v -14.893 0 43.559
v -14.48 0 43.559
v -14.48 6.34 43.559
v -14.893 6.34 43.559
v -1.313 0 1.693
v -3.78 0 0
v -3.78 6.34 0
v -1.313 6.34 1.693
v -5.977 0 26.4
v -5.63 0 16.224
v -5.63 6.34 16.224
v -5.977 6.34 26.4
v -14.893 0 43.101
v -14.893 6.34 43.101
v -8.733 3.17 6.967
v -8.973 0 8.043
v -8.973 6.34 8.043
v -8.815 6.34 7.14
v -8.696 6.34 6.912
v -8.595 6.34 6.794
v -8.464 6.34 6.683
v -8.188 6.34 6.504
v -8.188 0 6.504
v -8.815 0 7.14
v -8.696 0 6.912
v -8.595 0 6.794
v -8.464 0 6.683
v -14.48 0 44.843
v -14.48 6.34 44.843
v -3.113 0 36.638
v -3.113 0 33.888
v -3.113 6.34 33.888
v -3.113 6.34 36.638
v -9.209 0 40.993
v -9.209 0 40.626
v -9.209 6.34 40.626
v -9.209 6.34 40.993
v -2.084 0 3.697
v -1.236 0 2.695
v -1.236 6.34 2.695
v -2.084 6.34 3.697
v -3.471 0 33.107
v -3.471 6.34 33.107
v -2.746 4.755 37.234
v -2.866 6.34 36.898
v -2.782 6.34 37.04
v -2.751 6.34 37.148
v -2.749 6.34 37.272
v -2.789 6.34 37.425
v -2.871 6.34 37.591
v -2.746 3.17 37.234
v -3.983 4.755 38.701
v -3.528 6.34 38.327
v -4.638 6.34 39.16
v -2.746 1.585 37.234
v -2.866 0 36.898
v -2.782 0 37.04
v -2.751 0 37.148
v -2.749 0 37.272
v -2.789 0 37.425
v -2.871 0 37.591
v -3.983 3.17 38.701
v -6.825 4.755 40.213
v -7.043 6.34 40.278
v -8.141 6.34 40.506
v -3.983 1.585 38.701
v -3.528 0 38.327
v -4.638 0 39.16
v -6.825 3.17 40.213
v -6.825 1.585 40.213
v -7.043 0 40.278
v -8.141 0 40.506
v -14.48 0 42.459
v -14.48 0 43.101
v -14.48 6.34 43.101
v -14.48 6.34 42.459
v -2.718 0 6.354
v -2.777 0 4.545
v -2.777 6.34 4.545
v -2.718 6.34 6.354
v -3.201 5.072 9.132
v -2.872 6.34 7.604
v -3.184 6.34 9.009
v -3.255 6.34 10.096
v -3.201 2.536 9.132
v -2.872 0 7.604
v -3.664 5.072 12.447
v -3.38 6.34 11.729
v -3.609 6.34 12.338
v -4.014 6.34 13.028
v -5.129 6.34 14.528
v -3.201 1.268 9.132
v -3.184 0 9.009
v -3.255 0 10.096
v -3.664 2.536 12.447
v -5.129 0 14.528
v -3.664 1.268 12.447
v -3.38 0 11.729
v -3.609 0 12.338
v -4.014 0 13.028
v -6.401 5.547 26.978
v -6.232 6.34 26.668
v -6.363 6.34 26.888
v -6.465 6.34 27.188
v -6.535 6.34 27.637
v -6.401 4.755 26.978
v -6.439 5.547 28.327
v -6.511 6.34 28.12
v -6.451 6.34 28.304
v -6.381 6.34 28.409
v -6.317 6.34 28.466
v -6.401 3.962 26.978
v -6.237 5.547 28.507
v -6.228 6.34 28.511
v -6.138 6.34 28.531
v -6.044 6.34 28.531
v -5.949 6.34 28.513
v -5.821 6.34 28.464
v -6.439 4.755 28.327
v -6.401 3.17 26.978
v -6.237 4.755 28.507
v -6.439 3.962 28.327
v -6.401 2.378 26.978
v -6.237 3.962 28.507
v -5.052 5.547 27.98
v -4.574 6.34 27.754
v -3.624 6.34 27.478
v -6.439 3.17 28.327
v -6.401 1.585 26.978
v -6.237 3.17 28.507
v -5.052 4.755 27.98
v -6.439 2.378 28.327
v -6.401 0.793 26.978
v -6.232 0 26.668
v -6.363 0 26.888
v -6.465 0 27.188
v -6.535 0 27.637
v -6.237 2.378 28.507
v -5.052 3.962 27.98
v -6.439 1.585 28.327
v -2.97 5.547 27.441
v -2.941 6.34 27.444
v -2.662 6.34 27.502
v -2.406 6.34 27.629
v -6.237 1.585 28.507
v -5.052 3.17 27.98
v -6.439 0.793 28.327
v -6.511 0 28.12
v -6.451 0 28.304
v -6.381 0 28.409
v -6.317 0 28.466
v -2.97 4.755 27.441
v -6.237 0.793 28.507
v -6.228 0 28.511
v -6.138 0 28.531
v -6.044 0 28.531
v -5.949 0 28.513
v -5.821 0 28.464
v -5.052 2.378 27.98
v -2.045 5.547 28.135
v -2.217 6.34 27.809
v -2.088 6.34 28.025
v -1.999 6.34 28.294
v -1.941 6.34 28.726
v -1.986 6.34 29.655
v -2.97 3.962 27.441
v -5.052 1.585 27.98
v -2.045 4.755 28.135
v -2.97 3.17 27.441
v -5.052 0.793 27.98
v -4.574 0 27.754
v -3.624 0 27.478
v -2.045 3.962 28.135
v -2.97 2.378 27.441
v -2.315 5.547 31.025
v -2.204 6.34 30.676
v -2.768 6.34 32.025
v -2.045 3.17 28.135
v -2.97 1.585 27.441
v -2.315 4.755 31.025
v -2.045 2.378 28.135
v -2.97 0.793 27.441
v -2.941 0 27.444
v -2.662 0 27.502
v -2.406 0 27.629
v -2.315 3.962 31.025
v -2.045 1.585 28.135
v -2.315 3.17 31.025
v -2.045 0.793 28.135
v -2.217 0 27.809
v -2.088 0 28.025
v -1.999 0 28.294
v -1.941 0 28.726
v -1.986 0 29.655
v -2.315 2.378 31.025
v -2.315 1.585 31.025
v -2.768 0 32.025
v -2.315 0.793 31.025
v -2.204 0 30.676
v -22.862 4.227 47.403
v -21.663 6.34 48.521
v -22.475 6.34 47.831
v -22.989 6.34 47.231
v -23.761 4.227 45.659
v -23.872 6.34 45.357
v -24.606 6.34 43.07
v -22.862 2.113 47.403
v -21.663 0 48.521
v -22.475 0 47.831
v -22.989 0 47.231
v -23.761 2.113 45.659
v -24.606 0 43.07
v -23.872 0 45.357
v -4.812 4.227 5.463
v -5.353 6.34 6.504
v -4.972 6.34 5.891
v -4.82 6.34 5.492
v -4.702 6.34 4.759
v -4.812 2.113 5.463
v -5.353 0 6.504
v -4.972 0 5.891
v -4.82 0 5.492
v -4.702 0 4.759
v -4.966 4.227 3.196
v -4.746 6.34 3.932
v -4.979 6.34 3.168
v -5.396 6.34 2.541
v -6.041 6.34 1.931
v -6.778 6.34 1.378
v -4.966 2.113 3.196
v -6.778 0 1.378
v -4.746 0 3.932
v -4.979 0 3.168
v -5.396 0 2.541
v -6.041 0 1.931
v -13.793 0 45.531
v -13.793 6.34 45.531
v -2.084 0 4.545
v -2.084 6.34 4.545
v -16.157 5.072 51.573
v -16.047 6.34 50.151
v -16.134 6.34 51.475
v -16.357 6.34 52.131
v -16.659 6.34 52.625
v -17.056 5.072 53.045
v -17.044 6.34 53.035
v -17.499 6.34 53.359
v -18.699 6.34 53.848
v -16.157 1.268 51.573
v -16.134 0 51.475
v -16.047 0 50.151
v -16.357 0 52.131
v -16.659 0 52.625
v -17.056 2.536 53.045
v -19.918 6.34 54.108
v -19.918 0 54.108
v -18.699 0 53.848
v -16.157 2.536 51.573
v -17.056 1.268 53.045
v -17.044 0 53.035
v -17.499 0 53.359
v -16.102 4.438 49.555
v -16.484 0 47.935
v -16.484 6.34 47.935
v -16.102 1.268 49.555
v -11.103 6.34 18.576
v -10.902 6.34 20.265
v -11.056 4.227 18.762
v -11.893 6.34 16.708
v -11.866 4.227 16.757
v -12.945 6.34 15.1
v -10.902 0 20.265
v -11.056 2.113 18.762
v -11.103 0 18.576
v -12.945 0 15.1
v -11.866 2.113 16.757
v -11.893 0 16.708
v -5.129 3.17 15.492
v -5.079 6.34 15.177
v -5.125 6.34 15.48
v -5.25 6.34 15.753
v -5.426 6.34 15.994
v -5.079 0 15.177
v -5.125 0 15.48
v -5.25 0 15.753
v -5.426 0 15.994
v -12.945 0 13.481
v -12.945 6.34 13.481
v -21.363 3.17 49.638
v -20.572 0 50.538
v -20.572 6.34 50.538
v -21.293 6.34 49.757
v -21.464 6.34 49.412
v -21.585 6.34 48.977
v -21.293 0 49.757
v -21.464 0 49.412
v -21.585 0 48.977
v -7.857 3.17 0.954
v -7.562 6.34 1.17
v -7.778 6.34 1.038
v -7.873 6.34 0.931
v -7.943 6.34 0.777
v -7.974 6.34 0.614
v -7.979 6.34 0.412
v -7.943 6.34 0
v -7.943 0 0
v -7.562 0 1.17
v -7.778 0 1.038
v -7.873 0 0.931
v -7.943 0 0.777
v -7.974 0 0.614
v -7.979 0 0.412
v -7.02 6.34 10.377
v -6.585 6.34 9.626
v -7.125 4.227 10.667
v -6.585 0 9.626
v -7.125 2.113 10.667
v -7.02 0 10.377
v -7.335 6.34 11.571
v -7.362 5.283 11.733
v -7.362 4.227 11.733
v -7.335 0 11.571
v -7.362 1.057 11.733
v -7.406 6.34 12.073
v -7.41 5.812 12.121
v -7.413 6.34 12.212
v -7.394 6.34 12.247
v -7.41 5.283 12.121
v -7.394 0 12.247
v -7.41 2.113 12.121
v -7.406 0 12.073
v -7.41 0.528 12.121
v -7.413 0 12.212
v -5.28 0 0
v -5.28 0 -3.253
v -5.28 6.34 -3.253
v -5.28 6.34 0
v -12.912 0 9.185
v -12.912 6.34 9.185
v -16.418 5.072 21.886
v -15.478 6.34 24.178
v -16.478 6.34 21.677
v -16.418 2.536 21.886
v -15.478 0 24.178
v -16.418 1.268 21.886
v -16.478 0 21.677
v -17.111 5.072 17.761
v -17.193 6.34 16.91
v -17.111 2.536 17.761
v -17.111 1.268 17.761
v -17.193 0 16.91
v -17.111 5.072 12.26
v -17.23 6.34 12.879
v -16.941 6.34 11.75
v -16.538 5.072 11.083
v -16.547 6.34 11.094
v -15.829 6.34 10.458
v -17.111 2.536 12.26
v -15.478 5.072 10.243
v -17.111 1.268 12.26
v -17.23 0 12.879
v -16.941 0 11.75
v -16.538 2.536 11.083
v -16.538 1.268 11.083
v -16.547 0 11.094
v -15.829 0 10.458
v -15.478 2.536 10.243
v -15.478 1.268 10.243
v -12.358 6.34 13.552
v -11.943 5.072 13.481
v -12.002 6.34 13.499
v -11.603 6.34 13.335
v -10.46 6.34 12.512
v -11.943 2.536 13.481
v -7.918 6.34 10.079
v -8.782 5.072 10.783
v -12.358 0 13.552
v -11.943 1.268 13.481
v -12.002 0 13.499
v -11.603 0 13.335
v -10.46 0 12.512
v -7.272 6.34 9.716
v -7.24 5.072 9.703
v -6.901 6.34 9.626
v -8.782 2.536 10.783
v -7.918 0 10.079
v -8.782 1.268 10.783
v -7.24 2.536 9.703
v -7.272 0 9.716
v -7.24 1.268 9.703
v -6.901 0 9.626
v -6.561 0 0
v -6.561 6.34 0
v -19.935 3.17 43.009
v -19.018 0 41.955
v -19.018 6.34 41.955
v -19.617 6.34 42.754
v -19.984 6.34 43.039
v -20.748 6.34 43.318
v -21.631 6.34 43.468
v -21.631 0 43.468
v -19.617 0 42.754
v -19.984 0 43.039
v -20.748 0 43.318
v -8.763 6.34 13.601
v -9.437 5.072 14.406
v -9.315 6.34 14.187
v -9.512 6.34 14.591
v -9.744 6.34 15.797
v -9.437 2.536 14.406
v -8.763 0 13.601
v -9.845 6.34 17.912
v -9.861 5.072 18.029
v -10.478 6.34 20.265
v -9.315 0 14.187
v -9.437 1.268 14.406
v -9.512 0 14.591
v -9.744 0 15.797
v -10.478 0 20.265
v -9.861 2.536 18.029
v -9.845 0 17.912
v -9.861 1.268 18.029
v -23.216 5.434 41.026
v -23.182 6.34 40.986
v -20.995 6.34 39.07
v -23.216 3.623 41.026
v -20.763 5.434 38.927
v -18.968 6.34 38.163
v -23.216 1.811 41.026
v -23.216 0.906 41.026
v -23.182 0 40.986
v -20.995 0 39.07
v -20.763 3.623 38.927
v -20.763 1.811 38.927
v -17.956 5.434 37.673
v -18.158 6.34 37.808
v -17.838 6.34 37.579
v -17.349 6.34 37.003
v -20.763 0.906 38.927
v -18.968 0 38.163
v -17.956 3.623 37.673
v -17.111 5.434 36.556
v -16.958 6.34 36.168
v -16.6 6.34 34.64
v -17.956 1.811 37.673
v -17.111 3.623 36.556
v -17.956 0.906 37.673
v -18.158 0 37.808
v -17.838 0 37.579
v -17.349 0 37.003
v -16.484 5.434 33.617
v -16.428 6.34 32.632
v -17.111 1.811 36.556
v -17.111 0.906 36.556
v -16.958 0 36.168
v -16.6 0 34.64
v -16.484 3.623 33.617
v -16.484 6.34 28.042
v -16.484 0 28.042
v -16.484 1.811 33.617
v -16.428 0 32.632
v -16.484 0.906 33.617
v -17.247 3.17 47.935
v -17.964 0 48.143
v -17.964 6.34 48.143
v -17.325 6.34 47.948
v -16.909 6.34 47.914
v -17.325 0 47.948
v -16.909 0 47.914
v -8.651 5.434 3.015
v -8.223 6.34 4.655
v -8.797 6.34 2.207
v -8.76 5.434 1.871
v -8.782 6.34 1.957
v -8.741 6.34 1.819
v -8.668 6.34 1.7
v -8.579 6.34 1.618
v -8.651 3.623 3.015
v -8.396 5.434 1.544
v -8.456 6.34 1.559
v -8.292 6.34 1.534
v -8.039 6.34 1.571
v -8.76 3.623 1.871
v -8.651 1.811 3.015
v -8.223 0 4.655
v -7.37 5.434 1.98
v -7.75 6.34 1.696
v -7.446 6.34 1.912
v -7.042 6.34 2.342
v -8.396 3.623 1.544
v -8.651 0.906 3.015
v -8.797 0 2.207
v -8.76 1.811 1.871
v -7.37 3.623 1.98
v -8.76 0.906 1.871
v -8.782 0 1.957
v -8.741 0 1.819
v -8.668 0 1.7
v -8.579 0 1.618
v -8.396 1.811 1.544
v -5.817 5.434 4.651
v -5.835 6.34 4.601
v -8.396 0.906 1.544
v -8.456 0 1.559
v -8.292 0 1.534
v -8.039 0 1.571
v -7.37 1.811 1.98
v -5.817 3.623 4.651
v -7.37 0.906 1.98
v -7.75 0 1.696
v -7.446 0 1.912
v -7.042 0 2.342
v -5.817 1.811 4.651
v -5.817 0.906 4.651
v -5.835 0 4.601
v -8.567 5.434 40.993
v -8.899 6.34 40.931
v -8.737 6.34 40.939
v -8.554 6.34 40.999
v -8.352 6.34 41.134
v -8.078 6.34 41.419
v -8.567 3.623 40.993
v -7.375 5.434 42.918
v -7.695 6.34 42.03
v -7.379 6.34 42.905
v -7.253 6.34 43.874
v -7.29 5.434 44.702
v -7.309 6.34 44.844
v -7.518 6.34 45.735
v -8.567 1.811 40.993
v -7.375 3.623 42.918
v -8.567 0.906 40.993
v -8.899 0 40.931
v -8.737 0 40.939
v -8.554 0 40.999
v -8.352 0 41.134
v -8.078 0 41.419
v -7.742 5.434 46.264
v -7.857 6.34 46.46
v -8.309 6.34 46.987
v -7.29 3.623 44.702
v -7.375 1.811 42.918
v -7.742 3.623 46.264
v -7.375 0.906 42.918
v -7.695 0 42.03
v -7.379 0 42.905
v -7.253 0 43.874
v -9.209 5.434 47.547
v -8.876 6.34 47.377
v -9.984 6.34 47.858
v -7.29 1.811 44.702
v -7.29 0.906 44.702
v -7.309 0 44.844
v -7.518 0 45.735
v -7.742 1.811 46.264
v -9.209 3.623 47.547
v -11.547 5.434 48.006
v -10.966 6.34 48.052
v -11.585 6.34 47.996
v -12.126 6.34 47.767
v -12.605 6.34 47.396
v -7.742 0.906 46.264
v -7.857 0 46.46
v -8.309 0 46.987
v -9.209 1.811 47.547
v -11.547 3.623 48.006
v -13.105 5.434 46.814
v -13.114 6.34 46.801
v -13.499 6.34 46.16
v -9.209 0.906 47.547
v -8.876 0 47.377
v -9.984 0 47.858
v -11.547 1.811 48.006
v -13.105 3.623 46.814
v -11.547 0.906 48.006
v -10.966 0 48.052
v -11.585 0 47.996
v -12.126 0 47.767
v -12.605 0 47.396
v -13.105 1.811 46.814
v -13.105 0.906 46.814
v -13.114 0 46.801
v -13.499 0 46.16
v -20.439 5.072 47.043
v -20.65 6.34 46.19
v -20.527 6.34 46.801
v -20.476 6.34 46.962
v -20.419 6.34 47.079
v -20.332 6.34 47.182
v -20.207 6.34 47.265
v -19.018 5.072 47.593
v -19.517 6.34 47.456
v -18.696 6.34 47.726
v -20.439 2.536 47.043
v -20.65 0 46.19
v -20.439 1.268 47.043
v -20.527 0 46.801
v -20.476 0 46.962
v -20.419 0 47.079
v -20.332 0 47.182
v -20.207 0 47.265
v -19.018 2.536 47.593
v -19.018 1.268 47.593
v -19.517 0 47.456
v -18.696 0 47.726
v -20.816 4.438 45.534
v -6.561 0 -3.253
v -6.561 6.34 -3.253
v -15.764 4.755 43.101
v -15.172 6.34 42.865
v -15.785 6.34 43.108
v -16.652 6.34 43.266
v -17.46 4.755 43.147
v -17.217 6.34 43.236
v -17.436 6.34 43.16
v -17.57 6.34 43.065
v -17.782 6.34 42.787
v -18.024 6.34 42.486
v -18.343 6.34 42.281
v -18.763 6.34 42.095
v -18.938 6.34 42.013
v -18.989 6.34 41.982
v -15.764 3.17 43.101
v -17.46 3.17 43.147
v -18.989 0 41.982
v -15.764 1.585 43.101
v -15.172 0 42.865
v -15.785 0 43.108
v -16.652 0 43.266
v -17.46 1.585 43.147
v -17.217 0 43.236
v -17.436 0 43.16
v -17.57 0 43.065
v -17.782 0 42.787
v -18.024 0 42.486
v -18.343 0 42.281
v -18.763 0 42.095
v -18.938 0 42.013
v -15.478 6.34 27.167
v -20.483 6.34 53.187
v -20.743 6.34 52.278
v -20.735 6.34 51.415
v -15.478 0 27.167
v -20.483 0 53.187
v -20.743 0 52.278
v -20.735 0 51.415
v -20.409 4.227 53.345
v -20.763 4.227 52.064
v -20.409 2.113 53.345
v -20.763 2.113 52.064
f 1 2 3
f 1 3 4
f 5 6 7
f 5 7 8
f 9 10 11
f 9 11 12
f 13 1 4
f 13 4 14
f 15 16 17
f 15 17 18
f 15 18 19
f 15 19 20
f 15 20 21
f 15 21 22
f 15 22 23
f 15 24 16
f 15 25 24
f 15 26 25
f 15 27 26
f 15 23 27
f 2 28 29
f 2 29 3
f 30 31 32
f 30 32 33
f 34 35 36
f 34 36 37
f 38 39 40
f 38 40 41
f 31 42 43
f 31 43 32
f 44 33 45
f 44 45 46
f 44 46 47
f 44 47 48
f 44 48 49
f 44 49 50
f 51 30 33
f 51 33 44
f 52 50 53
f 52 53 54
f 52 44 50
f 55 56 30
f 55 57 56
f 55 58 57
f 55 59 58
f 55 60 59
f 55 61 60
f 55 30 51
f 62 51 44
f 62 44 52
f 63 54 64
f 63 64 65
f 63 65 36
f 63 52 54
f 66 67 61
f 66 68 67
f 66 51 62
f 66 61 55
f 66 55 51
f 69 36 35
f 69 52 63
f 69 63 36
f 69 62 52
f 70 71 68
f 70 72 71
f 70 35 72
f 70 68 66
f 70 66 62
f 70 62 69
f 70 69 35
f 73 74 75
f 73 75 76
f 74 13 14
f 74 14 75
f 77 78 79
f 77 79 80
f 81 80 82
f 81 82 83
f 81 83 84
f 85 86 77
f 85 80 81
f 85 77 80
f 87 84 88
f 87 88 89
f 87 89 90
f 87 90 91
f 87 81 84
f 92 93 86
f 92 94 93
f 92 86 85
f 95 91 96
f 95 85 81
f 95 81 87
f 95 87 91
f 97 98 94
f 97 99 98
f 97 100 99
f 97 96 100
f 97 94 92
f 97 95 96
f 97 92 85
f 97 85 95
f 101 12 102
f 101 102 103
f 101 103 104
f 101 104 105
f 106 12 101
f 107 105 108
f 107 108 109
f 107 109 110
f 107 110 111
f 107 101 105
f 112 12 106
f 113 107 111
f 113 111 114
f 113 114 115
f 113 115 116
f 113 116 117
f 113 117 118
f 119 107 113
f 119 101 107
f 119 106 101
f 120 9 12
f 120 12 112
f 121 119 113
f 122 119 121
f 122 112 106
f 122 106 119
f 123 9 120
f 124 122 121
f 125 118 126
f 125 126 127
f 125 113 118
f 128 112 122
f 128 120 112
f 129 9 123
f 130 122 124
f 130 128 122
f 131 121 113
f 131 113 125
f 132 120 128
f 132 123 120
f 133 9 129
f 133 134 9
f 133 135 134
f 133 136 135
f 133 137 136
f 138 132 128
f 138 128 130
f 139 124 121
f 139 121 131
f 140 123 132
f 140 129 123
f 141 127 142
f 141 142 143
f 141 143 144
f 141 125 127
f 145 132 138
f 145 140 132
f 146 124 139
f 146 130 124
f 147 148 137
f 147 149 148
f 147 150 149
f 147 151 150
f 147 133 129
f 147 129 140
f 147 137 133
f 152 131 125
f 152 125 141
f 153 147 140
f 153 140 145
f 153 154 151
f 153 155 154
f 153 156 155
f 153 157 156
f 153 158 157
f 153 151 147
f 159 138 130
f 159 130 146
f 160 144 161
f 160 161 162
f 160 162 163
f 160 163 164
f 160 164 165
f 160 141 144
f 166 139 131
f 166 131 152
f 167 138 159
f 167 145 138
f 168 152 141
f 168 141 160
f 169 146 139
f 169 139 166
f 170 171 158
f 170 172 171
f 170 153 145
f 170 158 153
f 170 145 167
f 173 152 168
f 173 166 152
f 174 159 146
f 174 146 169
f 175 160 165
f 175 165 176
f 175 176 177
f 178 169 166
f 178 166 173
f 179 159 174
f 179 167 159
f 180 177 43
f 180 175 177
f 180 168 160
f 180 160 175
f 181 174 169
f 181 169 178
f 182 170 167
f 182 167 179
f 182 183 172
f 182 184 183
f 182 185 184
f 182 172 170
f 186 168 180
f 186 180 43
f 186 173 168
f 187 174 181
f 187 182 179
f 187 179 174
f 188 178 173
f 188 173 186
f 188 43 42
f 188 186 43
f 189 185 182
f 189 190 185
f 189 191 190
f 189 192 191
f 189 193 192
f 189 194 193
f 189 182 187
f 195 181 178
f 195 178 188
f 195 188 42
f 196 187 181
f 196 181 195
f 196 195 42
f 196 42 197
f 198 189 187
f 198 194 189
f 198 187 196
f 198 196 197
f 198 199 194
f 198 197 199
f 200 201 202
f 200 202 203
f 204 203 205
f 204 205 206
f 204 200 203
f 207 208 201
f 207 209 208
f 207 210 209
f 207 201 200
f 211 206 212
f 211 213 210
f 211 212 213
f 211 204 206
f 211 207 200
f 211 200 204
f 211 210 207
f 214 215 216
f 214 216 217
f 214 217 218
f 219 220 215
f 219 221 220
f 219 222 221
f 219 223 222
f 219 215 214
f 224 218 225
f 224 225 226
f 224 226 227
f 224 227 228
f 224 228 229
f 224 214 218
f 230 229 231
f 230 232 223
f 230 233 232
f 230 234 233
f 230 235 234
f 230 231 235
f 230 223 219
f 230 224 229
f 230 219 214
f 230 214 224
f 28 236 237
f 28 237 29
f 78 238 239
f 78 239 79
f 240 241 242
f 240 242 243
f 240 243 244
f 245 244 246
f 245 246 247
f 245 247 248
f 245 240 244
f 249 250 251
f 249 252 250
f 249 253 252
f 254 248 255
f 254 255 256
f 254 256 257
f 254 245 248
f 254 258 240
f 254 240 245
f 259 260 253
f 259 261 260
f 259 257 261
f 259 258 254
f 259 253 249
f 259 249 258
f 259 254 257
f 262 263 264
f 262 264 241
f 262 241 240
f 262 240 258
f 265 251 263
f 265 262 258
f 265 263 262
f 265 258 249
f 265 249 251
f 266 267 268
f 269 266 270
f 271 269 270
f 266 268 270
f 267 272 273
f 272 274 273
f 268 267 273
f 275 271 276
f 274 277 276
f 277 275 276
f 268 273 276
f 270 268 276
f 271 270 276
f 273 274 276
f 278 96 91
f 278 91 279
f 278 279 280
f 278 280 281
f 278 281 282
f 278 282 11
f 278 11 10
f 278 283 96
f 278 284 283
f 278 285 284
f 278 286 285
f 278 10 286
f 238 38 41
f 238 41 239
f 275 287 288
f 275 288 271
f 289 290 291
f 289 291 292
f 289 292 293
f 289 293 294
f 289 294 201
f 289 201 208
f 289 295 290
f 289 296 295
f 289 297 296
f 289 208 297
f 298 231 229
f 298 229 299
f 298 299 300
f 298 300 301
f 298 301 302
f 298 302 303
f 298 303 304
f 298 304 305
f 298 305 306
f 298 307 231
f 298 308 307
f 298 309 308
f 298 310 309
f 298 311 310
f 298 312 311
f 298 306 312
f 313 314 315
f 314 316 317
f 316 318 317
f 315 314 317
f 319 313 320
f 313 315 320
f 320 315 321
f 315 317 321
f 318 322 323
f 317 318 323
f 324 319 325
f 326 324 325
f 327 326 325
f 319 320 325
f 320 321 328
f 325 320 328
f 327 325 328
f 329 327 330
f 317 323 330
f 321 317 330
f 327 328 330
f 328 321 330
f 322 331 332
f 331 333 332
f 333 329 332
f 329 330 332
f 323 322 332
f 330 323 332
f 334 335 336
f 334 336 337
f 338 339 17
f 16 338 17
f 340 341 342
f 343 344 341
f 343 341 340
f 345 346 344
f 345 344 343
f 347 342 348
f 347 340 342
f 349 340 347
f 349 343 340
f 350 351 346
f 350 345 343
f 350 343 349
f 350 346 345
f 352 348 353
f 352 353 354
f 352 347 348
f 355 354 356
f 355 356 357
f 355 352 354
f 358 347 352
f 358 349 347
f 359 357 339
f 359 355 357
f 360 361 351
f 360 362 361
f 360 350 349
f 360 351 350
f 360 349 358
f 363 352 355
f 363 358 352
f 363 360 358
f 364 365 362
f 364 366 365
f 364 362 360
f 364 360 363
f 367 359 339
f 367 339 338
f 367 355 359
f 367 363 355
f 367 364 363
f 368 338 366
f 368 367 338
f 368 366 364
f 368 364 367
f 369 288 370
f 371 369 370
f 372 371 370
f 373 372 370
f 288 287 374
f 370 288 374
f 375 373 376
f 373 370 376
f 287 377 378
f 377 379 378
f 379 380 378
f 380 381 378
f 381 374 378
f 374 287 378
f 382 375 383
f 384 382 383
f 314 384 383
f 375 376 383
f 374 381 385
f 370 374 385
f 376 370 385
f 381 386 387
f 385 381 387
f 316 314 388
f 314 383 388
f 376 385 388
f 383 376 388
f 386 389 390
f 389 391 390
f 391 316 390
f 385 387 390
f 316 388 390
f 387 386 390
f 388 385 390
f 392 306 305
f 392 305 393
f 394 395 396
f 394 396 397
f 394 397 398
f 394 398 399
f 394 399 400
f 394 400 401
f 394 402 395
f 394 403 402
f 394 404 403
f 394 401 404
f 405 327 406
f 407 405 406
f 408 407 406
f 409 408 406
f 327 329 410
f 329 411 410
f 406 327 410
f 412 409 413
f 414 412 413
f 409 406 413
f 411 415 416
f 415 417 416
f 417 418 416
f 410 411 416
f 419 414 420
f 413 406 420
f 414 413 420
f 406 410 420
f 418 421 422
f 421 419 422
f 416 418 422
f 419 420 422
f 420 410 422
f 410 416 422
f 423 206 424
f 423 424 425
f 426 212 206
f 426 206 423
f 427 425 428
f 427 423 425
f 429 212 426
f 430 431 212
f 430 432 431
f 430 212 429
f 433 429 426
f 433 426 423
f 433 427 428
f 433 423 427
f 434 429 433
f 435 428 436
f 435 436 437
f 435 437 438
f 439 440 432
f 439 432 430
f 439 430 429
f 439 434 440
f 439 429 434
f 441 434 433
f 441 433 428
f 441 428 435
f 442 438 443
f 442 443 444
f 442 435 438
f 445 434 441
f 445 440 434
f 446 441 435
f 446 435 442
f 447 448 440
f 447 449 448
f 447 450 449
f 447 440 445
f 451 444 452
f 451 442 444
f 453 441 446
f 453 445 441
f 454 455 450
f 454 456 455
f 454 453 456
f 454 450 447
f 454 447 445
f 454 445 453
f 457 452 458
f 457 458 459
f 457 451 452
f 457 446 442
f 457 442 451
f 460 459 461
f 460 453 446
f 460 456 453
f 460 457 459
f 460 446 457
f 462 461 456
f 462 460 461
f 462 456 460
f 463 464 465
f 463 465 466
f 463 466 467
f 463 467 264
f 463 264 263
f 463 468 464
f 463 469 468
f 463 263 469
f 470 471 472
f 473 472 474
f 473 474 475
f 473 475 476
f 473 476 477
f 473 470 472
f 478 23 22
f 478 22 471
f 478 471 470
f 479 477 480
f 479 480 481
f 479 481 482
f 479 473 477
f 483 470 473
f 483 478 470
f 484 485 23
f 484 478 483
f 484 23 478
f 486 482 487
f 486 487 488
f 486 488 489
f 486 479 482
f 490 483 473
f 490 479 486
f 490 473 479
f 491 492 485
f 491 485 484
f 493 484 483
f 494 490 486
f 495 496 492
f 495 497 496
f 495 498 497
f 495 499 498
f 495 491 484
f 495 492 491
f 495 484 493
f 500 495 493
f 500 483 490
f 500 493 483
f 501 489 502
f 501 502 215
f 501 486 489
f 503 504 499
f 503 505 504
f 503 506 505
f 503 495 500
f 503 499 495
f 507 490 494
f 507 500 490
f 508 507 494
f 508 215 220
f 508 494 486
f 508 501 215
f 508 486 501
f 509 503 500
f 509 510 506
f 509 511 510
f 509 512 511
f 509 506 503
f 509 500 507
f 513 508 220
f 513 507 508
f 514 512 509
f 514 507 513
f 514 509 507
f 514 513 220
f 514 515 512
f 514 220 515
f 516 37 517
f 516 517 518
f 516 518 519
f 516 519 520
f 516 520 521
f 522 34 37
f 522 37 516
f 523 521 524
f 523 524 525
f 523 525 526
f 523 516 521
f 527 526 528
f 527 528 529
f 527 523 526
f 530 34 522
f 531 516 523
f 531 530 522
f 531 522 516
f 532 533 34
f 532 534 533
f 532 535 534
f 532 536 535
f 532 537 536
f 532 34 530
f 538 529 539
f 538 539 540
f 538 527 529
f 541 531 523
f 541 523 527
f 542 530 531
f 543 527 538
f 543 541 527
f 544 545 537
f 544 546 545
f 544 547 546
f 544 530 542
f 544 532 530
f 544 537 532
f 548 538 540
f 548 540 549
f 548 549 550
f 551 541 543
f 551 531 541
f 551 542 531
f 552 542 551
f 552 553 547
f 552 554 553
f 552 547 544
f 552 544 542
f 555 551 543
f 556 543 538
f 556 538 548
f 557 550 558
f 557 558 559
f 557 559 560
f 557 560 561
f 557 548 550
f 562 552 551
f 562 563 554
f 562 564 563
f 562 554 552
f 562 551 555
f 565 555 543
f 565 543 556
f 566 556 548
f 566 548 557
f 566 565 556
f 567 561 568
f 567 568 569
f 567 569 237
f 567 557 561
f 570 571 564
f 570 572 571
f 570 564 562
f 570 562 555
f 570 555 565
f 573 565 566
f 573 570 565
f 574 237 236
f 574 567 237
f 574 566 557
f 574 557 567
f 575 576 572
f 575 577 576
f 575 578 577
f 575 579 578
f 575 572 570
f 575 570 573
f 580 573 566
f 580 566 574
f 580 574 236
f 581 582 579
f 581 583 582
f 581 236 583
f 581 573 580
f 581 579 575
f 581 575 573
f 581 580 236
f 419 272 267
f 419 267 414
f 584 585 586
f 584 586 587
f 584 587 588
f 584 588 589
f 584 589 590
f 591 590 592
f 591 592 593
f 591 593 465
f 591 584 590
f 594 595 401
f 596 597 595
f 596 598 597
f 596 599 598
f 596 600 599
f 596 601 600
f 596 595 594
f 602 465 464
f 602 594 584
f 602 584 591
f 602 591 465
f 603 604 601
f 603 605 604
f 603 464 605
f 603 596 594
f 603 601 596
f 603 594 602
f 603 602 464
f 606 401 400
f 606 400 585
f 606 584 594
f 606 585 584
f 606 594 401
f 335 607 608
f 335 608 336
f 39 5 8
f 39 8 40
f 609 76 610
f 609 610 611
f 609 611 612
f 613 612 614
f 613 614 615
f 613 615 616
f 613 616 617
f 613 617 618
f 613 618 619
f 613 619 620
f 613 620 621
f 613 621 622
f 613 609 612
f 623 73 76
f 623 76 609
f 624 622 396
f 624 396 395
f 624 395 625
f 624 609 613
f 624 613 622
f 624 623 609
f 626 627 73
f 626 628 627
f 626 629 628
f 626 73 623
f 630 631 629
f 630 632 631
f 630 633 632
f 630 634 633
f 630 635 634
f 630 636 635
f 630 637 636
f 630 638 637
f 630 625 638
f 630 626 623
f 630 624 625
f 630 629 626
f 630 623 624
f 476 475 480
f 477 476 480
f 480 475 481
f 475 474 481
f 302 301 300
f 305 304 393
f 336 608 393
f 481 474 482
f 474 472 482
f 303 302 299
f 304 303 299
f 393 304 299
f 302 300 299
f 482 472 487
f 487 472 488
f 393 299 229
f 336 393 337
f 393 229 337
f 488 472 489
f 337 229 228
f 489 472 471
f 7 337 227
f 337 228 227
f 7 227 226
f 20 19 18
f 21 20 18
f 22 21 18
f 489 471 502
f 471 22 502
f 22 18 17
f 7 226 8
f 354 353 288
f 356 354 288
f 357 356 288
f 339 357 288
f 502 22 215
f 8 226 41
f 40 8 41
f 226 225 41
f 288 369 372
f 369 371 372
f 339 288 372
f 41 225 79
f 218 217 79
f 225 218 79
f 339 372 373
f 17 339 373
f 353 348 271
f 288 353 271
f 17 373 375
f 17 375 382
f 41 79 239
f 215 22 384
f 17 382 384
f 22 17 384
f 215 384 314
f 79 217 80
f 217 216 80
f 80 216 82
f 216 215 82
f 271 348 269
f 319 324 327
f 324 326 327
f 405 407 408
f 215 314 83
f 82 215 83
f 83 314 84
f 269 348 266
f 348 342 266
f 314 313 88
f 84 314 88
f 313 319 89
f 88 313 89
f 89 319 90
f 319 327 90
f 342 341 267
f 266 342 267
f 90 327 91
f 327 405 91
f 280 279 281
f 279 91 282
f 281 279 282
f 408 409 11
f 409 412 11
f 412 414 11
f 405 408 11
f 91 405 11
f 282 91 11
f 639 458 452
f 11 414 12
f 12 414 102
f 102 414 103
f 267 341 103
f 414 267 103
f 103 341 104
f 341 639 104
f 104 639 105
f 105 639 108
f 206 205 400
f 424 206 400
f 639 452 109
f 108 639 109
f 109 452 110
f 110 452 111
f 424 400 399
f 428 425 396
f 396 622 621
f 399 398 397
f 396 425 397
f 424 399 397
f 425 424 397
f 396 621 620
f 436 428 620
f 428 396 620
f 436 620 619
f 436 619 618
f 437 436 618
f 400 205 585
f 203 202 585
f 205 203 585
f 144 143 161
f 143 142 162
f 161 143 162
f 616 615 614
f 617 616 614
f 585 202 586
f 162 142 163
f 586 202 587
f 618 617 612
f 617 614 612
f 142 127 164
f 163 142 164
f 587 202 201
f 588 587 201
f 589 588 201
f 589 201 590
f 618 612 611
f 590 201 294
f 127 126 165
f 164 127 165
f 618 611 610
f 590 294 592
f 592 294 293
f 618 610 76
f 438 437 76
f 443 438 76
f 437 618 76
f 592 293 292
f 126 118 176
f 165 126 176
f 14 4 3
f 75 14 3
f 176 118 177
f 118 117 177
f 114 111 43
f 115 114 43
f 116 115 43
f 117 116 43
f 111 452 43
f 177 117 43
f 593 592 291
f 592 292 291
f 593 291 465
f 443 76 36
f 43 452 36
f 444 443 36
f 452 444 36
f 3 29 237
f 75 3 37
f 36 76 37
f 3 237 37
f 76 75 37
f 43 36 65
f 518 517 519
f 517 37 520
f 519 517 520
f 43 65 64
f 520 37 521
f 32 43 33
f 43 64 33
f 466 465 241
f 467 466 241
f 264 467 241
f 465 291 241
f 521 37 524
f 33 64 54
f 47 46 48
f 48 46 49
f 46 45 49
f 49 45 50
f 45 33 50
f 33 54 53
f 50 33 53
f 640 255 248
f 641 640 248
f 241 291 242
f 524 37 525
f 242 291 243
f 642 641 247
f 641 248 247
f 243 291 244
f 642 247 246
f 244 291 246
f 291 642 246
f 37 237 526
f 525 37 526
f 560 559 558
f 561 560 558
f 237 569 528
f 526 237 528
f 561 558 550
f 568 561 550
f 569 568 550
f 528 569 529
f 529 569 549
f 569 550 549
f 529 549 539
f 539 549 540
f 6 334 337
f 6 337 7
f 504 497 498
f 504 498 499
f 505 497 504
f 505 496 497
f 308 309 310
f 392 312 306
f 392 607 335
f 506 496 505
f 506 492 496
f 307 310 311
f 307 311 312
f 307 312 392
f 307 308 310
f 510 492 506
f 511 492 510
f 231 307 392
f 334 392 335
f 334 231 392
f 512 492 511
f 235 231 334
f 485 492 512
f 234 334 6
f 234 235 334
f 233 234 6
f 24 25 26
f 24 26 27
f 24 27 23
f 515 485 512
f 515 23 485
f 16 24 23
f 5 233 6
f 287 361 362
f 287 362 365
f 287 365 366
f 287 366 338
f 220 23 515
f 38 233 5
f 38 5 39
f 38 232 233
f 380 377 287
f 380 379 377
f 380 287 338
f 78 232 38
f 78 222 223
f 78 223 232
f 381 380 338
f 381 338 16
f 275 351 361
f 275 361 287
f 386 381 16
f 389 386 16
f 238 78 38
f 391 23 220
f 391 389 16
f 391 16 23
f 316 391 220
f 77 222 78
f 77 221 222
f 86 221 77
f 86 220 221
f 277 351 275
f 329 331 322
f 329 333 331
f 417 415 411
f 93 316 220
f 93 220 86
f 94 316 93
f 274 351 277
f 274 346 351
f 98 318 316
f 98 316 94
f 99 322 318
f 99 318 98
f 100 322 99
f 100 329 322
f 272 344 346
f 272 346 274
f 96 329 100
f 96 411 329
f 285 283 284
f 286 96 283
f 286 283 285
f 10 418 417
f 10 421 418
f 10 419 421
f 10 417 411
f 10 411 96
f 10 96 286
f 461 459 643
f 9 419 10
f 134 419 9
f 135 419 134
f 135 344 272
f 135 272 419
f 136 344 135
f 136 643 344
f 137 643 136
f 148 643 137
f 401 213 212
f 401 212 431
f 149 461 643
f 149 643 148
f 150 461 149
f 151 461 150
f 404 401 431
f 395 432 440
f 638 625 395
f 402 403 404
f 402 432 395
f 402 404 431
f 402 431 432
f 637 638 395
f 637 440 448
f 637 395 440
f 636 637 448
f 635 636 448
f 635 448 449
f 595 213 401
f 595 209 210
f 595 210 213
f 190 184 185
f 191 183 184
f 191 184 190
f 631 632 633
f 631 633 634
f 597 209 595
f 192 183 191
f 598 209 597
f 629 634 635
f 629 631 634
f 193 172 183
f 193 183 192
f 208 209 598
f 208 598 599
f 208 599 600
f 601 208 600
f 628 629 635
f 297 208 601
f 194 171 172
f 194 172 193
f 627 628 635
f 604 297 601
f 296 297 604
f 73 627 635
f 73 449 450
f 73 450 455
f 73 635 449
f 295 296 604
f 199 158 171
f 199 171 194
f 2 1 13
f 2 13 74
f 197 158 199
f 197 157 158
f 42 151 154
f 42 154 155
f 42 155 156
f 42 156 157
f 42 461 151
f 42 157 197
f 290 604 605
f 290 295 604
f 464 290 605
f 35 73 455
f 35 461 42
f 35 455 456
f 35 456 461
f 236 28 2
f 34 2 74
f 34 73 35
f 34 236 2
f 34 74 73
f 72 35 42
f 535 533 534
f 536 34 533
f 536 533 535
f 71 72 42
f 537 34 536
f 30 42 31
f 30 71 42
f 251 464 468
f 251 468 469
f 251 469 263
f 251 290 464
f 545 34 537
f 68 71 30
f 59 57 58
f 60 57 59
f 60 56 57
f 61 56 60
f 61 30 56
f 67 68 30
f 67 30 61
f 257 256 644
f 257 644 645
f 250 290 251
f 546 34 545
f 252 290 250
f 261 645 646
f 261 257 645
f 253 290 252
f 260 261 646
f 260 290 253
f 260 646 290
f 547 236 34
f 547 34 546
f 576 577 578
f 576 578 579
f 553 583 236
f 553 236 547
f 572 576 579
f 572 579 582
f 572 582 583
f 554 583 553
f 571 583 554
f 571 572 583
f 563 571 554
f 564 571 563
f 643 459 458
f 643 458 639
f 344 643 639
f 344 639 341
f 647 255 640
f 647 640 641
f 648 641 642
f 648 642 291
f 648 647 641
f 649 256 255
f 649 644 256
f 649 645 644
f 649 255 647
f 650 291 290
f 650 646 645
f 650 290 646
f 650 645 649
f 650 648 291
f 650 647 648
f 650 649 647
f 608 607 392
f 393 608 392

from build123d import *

# Parameters (mm, degrees)
F0_W     = 1.2808465399
F0_H     = 3.2528243028
F1_DEPTH = 6.34


with BuildPart() as f1:
    # F0 (on Front) → F1 (new body)
    with BuildSketch(Plane.XZ):
        with BuildLine():
            add(Edge.make_bspline(
                [(-6.7776860669, 1.3776483247), (-7.2234603457, 1.2909326007), (-8.0743075484, 1.125418719), (-7.9850199205, 0.3629822004), (-7.9425117001, 0)],
                knots=[0, 0, 0, 0, 0.5239181341, 1, 1, 1, 1], degree=3))
            Line((-7.9425117001, 0), (-6.5613263287, 0))
            Line((-6.5613263287, 0), (-5.2804797888, 0))
            Line((-5.2804797888, 0), (-3.7796341348, 0))
            Line((-3.7796341348, 0), (-1.3127436396, 1.6925429227))
            Line((-1.3127436396, 1.6925429227), (-1.2356528314, 2.6947180741))
            Line((-1.2356528314, 2.6947180741), (-2.0836470649, 3.696893109))
            Line((-2.0836470649, 3.696893109), (-2.0836470649, 4.5448862948))
            Line((-2.0836470649, 4.5448862948), (-2.7774595656, 4.5448862948))
            add(Edge.make_bspline(
                [(-2.7774595656, 4.5448862948), (-2.7222918755, 5.4227665899), (-2.6171633368, 7.095671009), (-3.3418714879, 9.0647313949), (-3.1895937315, 11.1185620313), (-3.5661824677, 12.5226659789), (-4.5589625844, 13.7968401), (-5.1287151873, 14.528083615)],
                knots=[0, 0, 0, 0, 0.2208538869, 0.4208631238, 0.6150791168, 0.7790954196, 1, 1, 1, 1], degree=3))
            add(Edge.make_bspline(
                [(-5.1287151873, 14.528083615), (-5.0843041296, 14.8663420012), (-4.9972753618, 15.5291996788), (-5.4218763651, 15.9956514421), (-5.6298021227, 16.2240713835)],
                knots=[0, 0, 0, 0, 0.5103031883, 1, 1, 1, 1], degree=3))
            Line((-5.6298021227, 16.2240713835), (-5.9767086059, 26.3999961317))
            add(Edge.make_bspline(
                [(-5.9767086059, 26.3999961317), (-6.1345706405, 26.5459935085), (-6.5090194045, 26.892299303), (-6.6380961915, 28.4273694482), (-5.8892792504, 28.6339642055), (-5.0967846196, 27.8496412338), (-2.9462288603, 27.1864042532), (-1.6935919751, 28.0392956056), (-2.1433240874, 31.2088312454), (-3.0434896338, 32.4954295626), (-3.4712727647, 33.1068560481)],
                knots=[0, 0, 0, 0, 0.0887577471, 0.2105333863, 0.2847342937, 0.393212341, 0.5469207023, 0.6596399946, 0.8382516756, 1, 1, 1, 1], degree=3))
            Line((-3.4712727647, 33.1068560481), (-3.1125457026, 33.8876135647))
            Line((-3.1125457026, 33.8876135647), (-3.1125457026, 36.6379059851))
            add(Edge.make_bspline(
                [(-3.1125457026, 36.6379059851), (-2.9242706246, 36.816100008), (-2.424179038, 37.2894145462), (-4.0468332885, 38.9269143997), (-6.759011061, 40.3903422302), (-8.4321410003, 40.5511578163), (-9.2090247199, 40.6258292496)],
                knots=[0, 0, 0, 0, 0.1501364865, 0.3987888069, 0.7208398601, 1, 1, 1, 1], degree=3))
            Line((-9.2090247199, 40.6258292496), (-9.2090247199, 40.9925356507))
            add(Edge.make_bspline(
                [(-9.2090247199, 40.9925356507), (-9.0042836623, 40.9378253354), (-8.4149612837, 40.7803483081), (-6.9474231725, 42.9394160939), (-7.4419385897, 46.4591291567), (-9.1064865307, 47.6192620157), (-11.6272430043, 48.4378875285), (-13.1998511262, 46.8659793565), (-13.6052353603, 45.9530216087), (-13.7928435579, 45.530512929)],
                knots=[0, 0, 0, 0, 0.0826928045, 0.2380212391, 0.4274132015, 0.571526221, 0.7308515859, 0.8754405213, 1, 1, 1, 1], degree=3))
            Line((-13.7928435579, 45.530512929), (-14.4804157317, 44.8429398239))
            Line((-14.4804157317, 44.8429398239), (-14.4804157317, 43.5594730079))
            Line((-14.4804157317, 43.5594730079), (-14.8929599673, 43.5594730079))
            Line((-14.8929599673, 43.5594730079), (-14.8929599673, 43.1010909379))
            Line((-14.8929599673, 43.1010909379), (-14.4804157317, 43.1010909379))
            Line((-14.4804157317, 43.1010909379), (-14.4804157317, 42.4593538046))
            add(Edge.make_bspline(
                [(-14.4804157317, 42.4593538046), (-14.8571961778, 42.699844745), (-15.6436727796, 43.2018360228), (-17.6518789594, 43.4153809515), (-17.8380897009, 42.3469828314), (-18.9262205482, 42.0669953128), (-19.0183967352, 41.9551357627)],
                knots=[0, 0, 0, 0, 0.2495868987, 0.5209778212, 0.7197200287, 0.9369146526, 0.9369146526, 0.9369146526, 0.9369146526], degree=3))
            add(Edge.make_bspline(
                [(-19.0183967352, 41.9551357627), (-19.2771846319, 42.3572771528), (-19.8261713987, 43.2103707651), (-21.0069857299, 43.3787766294), (-21.6311737895, 43.467797339)],
                knots=[0, 0, 0, 0, 0.4713918665, 1, 1, 1, 1], degree=3))
            add(Edge.make_bspline(
                [(-21.6311737895, 43.467797339), (-21.261176445, 44.3217445242), (-20.6419167076, 45.7509848081), (-20.5443555782, 47.0749587473), (-20.0721625641, 47.3698835796), (-18.9532225125, 47.5267016677), (-18.2985894995, 47.9347867053), (-17.964117229, 48.1432899833)],
                knots=[0, 0, 0, 0, 0.2925402351, 0.489620782, 0.612532734, 0.8020309798, 1, 1, 1, 1], degree=3))
            add(Edge.make_bspline(
                [(-17.964117229, 48.1432899833), (-17.7283110743, 48.0565091036), (-17.2540926878, 47.8819882614), (-16.7417068114, 47.917122863), (-16.4841059595, 47.9347867053)],
                knots=[0, 0, 0, 0, 0.4972522394, 1, 1, 1, 1], degree=3))
            add(Edge.make_bspline(
                [(-16.4841059595, 47.9347867053), (-16.3508402803, 48.3747236264), (-16.0544834787, 49.3530572801), (-15.9482535449, 51.6243077123), (-16.93973462, 53.1586117555), (-18.4586786752, 53.842507887), (-19.437907688, 54.0207635328), (-19.9183057994, 54.1082136333)],
                knots=[0, 0, 0, 0, 0.186962934, 0.4157689921, 0.6180052423, 0.8125979135, 1, 1, 1, 1], degree=3))
            add(Edge.make_bspline(
                [(-19.9183057994, 54.1082136333), (-20.0892704668, 53.8754460058), (-20.4671656101, 53.3609434641), (-20.8945875679, 52.0398497722), (-20.6824038605, 51.0504799491), (-20.5724388361, 50.5377352238)],
                knots=[0, 0, 0, 0, 0.284700429, 0.6292932395, 1, 1, 1, 1], degree=3))
            add(Edge.make_bspline(
                [(-20.5724388361, 50.5377352238), (-20.8767073715, 50.2578751595), (-21.4800686114, 49.7029156559), (-21.6021464823, 48.9125958799), (-21.6626618057, 48.5208258033)],
                knots=[0, 0, 0, 0, 0.5042891642, 1, 1, 1, 1], degree=3))
            add(Edge.make_bspline(
                [(-21.6626618057, 48.5208258033), (-22.0911120554, 48.1806338043), (-22.9883761393, 47.4682008845), (-23.8278366025, 45.6306762926), (-24.3330200442, 43.9686563308), (-24.6062595397, 43.069716543)],
                knots=[0, 0, 0, 0, 0.295575469, 0.6189966107, 1, 1, 1, 1], degree=3))
            add(Edge.make_bspline(
                [(-24.6062595397, 43.069716543), (-24.2088613706, 42.3943300533), (-23.3573277559, 40.9471308877), (-20.8834350039, 38.796575858), (-19.092937599, 38.2207451839), (-17.8771301181, 37.7588553364), (-16.9223054993, 36.5178417531), (-16.304212218, 33.4348004163), (-16.4183104534, 30.0145111495), (-16.4841059595, 28.042178601)],
                knots=[0, 0, 0, 0, 0.1414851406, 0.303170378, 0.4261666022, 0.5250294059, 0.6315409101, 0.7875256158, 1, 1, 1, 1], degree=3))
            Line((-16.4841059595, 28.042178601), (-15.4783679172, 27.1670408547))
            Line((-15.4783679172, 27.1670408547), (-15.4783679172, 24.1778809577))
            add(Edge.make_bspline(
                [(-15.4783679172, 24.1778809577), (-15.819948896, 23.4628340345), (-16.6054142494, 21.818583859), (-17.160909052, 17.8298393788), (-17.5813935603, 12.1158867751), (-15.573659095, 9.8434809807), (-11.4976484067, 8.7314972431), (-8.9733516797, 8.0428393558)],
                knots=[0, 0, 0, 0, 0.1543664225, 0.3549655401, 0.5849931188, 0.7429838654, 1, 1, 1, 1], degree=3))
            add(Edge.make_bspline(
                [(-8.9733516797, 8.0428393558), (-8.9334954044, 7.6382117185), (-8.8615238429, 6.9075442728), (-8.395744175, 6.6286117251), (-8.1879030913, 6.5041459166)],
                knots=[0, 0, 0, 0, 0.5537781103, 1, 1, 1, 1], degree=3))
            add(Edge.make_bspline(
                [(-8.1879030913, 6.5041459166), (-8.1484120775, 5.9702080713), (-8.0662376236, 4.8591692129), (-8.6706458584, 3.0967752673), (-8.8994119275, 1.8708309777), (-8.3803766729, 1.402193652), (-7.1065827749, 1.8585570796), (-5.6813956349, 4.6532572148), (-5.4535982924, 5.9384340625), (-5.3533259779, 6.5041459166)],
                knots=[0, 0, 0, 0, 0.1482015961, 0.3083837071, 0.4326583064, 0.5137610087, 0.6361003484, 0.8398178842, 1, 1, 1, 1], degree=3))
            add(Edge.make_bspline(
                [(-5.3533259779, 6.5041459166), (-5.1441952315, 6.208622874), (-4.6439717987, 5.5017562207), (-4.6302443302, 2.9305348325), (-6.0475197284, 1.9056558772), (-6.7776860669, 1.3776483247)],
                knots=[0, 0, 0, 0, 0.2583273038, 0.6178975253, 1, 1, 1, 1], degree=3))
        make_face()
        with BuildLine():
            add(Edge.make_bspline(
                [(-10.9020192176, 20.2647801489), (-10.9163398693, 19.7825054325), (-10.9477882284, 18.7234231482), (-11.8113882763, 16.6986290351), (-12.5727067901, 15.6247452688), (-12.9449125379, 15.0997275487)],
                knots=[0, 0, 0, 0, 0.2993956384, 0.6574771719, 1, 1, 1, 1], degree=3))
            Line((-10.9020192176, 20.2647801489), (-10.4780225083, 20.2647801489))
            add(Edge.make_bspline(
                [(-7.3944088072, 12.2473854572), (-7.8188548307, 12.6909915122), (-8.5996044275, 13.5069851355), (-9.6314978263, 14.2844156033), (-9.8279951055, 16.5550906501), (-9.7515163015, 18.0322112447), (-10.220018893, 19.4719295947), (-10.4780225083, 20.2647801489)],
                knots=[0, 0, 0, 0, 0.1986847623, 0.3654717901, 0.5839980475, 0.7709084012, 1, 1, 1, 1], degree=3))
            add(Edge.make_bspline(
                [(-6.584960036, 9.626314044), (-6.7772077658, 9.8949634142), (-7.1971655786, 10.5135634703), (-7.441410096, 12.1917721213), (-7.4069225229, 12.2413560748), (-7.3944088072, 12.2473854572)],
                knots=[0, 0, 0, 0, 0.4259273593, 0.9186271459, 1, 1, 1, 1], degree=3))
            add(Edge.make_bspline(
                [(-12.9449125379, 13.4808309376), (-12.6359389461, 13.5427933983), (-11.8567554088, 13.6990531258), (-9.920582259, 12.1197704522), (-8.9324353041, 10.8011768775), (-7.310806571, 9.5896443746), (-6.781723916, 9.6163735592), (-6.584960036, 9.626314044)],
                knots=[0, 0, 0, 0, 0.1649126046, 0.415884043, 0.640198903, 0.8661913045, 1, 1, 1, 1], degree=3))
            Line((-12.9449125379, 13.4808309376), (-12.9449125379, 15.0997275487))
        make_face(mode=Mode.SUBTRACT)
        with Locations((-5.9209030587, -1.6264121514)):
            Rectangle(F0_W, F0_H)
    extrude(amount=-F1_DEPTH)


solid = f1.part
